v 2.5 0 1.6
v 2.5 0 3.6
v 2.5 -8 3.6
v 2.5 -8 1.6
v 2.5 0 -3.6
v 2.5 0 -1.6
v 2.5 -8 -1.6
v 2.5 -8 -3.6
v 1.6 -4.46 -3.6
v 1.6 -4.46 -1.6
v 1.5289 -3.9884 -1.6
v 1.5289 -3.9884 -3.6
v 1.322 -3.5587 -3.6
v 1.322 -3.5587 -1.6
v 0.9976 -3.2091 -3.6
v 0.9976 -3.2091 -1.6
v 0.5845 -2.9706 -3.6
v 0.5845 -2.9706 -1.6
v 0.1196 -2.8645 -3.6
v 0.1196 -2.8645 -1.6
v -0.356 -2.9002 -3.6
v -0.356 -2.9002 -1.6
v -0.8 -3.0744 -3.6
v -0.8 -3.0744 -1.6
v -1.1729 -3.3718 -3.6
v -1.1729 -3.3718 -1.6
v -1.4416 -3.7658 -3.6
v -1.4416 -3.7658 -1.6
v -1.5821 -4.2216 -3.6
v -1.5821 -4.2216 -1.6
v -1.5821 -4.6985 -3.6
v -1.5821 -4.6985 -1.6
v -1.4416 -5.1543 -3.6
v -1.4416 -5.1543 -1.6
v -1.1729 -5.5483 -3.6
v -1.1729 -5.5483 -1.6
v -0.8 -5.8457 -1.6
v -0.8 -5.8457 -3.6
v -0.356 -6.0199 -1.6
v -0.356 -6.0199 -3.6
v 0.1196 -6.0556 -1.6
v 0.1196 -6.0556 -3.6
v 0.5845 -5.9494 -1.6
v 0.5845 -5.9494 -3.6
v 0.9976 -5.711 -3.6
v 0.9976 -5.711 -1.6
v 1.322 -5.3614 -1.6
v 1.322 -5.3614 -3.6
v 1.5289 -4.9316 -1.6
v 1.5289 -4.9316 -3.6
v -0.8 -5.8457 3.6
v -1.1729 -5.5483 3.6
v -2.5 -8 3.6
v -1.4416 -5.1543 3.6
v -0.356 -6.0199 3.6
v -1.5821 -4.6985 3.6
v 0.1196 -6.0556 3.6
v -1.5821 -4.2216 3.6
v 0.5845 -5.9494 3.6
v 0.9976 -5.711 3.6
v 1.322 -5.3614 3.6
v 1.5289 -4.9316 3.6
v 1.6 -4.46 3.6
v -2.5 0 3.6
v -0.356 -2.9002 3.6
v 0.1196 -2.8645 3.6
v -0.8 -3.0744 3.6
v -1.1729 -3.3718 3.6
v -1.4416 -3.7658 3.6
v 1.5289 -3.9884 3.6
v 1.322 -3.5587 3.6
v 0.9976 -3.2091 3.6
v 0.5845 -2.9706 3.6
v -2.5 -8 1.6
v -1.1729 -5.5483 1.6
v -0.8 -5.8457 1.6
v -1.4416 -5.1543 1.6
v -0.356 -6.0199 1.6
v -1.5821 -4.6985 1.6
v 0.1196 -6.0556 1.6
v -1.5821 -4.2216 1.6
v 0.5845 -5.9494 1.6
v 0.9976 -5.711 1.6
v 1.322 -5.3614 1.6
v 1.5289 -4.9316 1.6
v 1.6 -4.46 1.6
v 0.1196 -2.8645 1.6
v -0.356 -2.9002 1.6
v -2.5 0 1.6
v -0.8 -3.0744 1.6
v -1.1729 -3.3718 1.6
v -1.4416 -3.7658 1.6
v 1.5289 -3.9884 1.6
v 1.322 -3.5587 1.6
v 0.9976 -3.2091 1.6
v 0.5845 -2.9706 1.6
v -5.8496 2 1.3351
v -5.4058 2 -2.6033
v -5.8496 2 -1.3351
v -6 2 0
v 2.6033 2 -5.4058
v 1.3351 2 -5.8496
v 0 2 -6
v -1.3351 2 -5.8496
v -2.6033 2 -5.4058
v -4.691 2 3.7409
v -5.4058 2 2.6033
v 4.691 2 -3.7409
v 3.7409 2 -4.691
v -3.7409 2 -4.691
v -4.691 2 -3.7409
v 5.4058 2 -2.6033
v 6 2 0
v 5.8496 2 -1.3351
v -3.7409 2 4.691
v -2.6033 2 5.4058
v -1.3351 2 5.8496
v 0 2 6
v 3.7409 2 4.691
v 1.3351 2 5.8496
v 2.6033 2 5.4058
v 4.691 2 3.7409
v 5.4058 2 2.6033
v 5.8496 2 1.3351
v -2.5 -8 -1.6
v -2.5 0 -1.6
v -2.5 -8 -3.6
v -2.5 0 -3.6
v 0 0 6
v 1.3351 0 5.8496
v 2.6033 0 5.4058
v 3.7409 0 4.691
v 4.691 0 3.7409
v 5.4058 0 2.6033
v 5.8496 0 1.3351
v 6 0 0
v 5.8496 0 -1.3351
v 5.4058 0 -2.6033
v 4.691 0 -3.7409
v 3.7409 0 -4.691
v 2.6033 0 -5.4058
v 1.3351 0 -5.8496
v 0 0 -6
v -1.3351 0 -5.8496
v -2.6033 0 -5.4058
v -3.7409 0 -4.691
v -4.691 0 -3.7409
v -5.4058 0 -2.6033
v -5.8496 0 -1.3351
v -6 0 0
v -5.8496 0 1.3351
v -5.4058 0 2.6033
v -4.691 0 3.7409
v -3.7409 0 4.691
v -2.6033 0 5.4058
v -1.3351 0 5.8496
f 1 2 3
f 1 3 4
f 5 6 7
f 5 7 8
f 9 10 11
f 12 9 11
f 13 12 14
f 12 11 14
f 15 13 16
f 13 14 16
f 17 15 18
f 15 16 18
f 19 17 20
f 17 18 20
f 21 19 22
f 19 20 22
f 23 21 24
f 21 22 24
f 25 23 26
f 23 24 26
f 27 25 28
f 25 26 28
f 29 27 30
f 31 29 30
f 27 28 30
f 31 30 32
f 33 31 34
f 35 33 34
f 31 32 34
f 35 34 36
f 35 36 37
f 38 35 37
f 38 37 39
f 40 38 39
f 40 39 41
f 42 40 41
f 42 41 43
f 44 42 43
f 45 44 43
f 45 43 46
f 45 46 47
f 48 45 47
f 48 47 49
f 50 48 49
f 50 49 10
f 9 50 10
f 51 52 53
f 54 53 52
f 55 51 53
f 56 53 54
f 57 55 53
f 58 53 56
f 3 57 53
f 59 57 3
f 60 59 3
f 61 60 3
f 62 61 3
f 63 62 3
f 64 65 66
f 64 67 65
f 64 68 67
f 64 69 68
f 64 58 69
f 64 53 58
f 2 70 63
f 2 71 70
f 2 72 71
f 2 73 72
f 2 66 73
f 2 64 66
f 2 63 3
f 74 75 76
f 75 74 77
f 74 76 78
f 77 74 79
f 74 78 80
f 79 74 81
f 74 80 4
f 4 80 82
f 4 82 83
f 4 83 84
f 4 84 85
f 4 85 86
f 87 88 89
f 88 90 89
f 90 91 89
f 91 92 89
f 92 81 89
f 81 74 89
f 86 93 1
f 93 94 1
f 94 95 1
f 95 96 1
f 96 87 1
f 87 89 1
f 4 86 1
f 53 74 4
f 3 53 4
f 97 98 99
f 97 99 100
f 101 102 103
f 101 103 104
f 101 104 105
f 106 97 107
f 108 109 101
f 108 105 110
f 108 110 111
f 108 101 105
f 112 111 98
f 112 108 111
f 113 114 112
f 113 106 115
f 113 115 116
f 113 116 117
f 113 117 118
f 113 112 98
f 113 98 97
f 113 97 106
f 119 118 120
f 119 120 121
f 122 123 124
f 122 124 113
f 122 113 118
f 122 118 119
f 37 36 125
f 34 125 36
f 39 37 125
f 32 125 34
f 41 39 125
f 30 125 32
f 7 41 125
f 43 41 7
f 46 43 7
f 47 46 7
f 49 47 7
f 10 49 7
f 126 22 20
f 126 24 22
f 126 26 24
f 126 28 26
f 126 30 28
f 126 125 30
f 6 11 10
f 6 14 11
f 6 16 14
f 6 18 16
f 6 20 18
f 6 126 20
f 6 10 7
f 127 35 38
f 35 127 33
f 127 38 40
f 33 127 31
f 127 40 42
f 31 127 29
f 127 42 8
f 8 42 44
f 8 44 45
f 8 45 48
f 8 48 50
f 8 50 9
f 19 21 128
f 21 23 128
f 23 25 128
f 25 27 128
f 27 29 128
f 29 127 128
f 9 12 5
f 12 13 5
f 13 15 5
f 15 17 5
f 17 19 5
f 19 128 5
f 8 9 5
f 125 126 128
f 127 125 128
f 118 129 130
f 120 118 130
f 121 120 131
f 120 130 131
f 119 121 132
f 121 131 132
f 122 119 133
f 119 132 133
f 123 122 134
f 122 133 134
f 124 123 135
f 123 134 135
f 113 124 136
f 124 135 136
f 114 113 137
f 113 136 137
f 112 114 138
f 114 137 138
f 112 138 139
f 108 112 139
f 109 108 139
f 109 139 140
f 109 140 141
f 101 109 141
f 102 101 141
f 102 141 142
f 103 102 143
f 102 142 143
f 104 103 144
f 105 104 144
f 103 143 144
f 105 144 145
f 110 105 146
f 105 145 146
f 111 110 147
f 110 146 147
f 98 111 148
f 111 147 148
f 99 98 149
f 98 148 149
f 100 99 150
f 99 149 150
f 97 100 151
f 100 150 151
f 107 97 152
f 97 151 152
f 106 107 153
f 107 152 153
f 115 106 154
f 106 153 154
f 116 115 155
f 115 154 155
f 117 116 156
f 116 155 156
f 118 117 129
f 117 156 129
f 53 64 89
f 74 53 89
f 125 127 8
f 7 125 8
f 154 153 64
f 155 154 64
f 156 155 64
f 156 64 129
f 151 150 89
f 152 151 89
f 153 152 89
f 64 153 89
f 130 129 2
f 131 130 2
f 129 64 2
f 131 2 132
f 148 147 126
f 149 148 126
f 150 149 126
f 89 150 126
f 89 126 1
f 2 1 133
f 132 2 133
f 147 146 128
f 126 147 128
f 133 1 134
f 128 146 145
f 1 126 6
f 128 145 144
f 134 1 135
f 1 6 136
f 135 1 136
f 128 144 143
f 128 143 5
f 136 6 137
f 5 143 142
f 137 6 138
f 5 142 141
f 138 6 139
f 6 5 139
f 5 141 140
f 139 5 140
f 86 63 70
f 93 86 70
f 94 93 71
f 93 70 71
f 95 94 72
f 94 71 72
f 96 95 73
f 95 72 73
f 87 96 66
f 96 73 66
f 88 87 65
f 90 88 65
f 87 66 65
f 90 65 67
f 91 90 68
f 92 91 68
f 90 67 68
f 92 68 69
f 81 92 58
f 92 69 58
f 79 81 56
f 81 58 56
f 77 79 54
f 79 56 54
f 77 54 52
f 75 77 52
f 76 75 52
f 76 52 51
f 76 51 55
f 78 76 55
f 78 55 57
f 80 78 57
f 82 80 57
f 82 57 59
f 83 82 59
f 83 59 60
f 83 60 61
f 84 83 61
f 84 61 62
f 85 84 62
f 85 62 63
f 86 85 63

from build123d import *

# Parameters (mm, degrees)
SKETCH_1_R          = 6
EXTRUDE_1_DEPTH     = 2
SKETCH_1_3_W        = 5
SKETCH_1_3_H        = 2
EXTRUDE_2_DEPTH     = 8
SKETCH_2_R          = 1.6
CUT_EXTRUDE_1_DEPTH = 14.862178761


with BuildPart() as part:
    # 草图1 → 凸台-拉伸1 (new body)
    with BuildSketch(Plane(origin=(0, 0, 0), x_dir=(1, 0, 0), z_dir=(0, 1, 0))):
        Circle(SKETCH_1_R)
    extrude(amount=EXTRUDE_1_DEPTH)

    # 草图1<3> → 凸台-拉伸2 (add)
    with BuildSketch(Plane(origin=(0, 0, 0), x_dir=(1, 0, 0), z_dir=(0, 1, 0))):
        with Locations((0, 2.6)):
            Rectangle(SKETCH_1_3_W, SKETCH_1_3_H)
        with Locations((0, -2.6)):
            Rectangle(SKETCH_1_3_W, SKETCH_1_3_H)
    extrude(amount=-EXTRUDE_2_DEPTH)

    # 草图2 → 切除-拉伸1 (cut, through all)
    with BuildSketch(Plane.XY.offset(3.6)):
        with Locations((0, -4.46004136)):
            Circle(SKETCH_2_R)
    extrude(amount=-CUT_EXTRUDE_1_DEPTH, mode=Mode.SUBTRACT)


solid = part.part
